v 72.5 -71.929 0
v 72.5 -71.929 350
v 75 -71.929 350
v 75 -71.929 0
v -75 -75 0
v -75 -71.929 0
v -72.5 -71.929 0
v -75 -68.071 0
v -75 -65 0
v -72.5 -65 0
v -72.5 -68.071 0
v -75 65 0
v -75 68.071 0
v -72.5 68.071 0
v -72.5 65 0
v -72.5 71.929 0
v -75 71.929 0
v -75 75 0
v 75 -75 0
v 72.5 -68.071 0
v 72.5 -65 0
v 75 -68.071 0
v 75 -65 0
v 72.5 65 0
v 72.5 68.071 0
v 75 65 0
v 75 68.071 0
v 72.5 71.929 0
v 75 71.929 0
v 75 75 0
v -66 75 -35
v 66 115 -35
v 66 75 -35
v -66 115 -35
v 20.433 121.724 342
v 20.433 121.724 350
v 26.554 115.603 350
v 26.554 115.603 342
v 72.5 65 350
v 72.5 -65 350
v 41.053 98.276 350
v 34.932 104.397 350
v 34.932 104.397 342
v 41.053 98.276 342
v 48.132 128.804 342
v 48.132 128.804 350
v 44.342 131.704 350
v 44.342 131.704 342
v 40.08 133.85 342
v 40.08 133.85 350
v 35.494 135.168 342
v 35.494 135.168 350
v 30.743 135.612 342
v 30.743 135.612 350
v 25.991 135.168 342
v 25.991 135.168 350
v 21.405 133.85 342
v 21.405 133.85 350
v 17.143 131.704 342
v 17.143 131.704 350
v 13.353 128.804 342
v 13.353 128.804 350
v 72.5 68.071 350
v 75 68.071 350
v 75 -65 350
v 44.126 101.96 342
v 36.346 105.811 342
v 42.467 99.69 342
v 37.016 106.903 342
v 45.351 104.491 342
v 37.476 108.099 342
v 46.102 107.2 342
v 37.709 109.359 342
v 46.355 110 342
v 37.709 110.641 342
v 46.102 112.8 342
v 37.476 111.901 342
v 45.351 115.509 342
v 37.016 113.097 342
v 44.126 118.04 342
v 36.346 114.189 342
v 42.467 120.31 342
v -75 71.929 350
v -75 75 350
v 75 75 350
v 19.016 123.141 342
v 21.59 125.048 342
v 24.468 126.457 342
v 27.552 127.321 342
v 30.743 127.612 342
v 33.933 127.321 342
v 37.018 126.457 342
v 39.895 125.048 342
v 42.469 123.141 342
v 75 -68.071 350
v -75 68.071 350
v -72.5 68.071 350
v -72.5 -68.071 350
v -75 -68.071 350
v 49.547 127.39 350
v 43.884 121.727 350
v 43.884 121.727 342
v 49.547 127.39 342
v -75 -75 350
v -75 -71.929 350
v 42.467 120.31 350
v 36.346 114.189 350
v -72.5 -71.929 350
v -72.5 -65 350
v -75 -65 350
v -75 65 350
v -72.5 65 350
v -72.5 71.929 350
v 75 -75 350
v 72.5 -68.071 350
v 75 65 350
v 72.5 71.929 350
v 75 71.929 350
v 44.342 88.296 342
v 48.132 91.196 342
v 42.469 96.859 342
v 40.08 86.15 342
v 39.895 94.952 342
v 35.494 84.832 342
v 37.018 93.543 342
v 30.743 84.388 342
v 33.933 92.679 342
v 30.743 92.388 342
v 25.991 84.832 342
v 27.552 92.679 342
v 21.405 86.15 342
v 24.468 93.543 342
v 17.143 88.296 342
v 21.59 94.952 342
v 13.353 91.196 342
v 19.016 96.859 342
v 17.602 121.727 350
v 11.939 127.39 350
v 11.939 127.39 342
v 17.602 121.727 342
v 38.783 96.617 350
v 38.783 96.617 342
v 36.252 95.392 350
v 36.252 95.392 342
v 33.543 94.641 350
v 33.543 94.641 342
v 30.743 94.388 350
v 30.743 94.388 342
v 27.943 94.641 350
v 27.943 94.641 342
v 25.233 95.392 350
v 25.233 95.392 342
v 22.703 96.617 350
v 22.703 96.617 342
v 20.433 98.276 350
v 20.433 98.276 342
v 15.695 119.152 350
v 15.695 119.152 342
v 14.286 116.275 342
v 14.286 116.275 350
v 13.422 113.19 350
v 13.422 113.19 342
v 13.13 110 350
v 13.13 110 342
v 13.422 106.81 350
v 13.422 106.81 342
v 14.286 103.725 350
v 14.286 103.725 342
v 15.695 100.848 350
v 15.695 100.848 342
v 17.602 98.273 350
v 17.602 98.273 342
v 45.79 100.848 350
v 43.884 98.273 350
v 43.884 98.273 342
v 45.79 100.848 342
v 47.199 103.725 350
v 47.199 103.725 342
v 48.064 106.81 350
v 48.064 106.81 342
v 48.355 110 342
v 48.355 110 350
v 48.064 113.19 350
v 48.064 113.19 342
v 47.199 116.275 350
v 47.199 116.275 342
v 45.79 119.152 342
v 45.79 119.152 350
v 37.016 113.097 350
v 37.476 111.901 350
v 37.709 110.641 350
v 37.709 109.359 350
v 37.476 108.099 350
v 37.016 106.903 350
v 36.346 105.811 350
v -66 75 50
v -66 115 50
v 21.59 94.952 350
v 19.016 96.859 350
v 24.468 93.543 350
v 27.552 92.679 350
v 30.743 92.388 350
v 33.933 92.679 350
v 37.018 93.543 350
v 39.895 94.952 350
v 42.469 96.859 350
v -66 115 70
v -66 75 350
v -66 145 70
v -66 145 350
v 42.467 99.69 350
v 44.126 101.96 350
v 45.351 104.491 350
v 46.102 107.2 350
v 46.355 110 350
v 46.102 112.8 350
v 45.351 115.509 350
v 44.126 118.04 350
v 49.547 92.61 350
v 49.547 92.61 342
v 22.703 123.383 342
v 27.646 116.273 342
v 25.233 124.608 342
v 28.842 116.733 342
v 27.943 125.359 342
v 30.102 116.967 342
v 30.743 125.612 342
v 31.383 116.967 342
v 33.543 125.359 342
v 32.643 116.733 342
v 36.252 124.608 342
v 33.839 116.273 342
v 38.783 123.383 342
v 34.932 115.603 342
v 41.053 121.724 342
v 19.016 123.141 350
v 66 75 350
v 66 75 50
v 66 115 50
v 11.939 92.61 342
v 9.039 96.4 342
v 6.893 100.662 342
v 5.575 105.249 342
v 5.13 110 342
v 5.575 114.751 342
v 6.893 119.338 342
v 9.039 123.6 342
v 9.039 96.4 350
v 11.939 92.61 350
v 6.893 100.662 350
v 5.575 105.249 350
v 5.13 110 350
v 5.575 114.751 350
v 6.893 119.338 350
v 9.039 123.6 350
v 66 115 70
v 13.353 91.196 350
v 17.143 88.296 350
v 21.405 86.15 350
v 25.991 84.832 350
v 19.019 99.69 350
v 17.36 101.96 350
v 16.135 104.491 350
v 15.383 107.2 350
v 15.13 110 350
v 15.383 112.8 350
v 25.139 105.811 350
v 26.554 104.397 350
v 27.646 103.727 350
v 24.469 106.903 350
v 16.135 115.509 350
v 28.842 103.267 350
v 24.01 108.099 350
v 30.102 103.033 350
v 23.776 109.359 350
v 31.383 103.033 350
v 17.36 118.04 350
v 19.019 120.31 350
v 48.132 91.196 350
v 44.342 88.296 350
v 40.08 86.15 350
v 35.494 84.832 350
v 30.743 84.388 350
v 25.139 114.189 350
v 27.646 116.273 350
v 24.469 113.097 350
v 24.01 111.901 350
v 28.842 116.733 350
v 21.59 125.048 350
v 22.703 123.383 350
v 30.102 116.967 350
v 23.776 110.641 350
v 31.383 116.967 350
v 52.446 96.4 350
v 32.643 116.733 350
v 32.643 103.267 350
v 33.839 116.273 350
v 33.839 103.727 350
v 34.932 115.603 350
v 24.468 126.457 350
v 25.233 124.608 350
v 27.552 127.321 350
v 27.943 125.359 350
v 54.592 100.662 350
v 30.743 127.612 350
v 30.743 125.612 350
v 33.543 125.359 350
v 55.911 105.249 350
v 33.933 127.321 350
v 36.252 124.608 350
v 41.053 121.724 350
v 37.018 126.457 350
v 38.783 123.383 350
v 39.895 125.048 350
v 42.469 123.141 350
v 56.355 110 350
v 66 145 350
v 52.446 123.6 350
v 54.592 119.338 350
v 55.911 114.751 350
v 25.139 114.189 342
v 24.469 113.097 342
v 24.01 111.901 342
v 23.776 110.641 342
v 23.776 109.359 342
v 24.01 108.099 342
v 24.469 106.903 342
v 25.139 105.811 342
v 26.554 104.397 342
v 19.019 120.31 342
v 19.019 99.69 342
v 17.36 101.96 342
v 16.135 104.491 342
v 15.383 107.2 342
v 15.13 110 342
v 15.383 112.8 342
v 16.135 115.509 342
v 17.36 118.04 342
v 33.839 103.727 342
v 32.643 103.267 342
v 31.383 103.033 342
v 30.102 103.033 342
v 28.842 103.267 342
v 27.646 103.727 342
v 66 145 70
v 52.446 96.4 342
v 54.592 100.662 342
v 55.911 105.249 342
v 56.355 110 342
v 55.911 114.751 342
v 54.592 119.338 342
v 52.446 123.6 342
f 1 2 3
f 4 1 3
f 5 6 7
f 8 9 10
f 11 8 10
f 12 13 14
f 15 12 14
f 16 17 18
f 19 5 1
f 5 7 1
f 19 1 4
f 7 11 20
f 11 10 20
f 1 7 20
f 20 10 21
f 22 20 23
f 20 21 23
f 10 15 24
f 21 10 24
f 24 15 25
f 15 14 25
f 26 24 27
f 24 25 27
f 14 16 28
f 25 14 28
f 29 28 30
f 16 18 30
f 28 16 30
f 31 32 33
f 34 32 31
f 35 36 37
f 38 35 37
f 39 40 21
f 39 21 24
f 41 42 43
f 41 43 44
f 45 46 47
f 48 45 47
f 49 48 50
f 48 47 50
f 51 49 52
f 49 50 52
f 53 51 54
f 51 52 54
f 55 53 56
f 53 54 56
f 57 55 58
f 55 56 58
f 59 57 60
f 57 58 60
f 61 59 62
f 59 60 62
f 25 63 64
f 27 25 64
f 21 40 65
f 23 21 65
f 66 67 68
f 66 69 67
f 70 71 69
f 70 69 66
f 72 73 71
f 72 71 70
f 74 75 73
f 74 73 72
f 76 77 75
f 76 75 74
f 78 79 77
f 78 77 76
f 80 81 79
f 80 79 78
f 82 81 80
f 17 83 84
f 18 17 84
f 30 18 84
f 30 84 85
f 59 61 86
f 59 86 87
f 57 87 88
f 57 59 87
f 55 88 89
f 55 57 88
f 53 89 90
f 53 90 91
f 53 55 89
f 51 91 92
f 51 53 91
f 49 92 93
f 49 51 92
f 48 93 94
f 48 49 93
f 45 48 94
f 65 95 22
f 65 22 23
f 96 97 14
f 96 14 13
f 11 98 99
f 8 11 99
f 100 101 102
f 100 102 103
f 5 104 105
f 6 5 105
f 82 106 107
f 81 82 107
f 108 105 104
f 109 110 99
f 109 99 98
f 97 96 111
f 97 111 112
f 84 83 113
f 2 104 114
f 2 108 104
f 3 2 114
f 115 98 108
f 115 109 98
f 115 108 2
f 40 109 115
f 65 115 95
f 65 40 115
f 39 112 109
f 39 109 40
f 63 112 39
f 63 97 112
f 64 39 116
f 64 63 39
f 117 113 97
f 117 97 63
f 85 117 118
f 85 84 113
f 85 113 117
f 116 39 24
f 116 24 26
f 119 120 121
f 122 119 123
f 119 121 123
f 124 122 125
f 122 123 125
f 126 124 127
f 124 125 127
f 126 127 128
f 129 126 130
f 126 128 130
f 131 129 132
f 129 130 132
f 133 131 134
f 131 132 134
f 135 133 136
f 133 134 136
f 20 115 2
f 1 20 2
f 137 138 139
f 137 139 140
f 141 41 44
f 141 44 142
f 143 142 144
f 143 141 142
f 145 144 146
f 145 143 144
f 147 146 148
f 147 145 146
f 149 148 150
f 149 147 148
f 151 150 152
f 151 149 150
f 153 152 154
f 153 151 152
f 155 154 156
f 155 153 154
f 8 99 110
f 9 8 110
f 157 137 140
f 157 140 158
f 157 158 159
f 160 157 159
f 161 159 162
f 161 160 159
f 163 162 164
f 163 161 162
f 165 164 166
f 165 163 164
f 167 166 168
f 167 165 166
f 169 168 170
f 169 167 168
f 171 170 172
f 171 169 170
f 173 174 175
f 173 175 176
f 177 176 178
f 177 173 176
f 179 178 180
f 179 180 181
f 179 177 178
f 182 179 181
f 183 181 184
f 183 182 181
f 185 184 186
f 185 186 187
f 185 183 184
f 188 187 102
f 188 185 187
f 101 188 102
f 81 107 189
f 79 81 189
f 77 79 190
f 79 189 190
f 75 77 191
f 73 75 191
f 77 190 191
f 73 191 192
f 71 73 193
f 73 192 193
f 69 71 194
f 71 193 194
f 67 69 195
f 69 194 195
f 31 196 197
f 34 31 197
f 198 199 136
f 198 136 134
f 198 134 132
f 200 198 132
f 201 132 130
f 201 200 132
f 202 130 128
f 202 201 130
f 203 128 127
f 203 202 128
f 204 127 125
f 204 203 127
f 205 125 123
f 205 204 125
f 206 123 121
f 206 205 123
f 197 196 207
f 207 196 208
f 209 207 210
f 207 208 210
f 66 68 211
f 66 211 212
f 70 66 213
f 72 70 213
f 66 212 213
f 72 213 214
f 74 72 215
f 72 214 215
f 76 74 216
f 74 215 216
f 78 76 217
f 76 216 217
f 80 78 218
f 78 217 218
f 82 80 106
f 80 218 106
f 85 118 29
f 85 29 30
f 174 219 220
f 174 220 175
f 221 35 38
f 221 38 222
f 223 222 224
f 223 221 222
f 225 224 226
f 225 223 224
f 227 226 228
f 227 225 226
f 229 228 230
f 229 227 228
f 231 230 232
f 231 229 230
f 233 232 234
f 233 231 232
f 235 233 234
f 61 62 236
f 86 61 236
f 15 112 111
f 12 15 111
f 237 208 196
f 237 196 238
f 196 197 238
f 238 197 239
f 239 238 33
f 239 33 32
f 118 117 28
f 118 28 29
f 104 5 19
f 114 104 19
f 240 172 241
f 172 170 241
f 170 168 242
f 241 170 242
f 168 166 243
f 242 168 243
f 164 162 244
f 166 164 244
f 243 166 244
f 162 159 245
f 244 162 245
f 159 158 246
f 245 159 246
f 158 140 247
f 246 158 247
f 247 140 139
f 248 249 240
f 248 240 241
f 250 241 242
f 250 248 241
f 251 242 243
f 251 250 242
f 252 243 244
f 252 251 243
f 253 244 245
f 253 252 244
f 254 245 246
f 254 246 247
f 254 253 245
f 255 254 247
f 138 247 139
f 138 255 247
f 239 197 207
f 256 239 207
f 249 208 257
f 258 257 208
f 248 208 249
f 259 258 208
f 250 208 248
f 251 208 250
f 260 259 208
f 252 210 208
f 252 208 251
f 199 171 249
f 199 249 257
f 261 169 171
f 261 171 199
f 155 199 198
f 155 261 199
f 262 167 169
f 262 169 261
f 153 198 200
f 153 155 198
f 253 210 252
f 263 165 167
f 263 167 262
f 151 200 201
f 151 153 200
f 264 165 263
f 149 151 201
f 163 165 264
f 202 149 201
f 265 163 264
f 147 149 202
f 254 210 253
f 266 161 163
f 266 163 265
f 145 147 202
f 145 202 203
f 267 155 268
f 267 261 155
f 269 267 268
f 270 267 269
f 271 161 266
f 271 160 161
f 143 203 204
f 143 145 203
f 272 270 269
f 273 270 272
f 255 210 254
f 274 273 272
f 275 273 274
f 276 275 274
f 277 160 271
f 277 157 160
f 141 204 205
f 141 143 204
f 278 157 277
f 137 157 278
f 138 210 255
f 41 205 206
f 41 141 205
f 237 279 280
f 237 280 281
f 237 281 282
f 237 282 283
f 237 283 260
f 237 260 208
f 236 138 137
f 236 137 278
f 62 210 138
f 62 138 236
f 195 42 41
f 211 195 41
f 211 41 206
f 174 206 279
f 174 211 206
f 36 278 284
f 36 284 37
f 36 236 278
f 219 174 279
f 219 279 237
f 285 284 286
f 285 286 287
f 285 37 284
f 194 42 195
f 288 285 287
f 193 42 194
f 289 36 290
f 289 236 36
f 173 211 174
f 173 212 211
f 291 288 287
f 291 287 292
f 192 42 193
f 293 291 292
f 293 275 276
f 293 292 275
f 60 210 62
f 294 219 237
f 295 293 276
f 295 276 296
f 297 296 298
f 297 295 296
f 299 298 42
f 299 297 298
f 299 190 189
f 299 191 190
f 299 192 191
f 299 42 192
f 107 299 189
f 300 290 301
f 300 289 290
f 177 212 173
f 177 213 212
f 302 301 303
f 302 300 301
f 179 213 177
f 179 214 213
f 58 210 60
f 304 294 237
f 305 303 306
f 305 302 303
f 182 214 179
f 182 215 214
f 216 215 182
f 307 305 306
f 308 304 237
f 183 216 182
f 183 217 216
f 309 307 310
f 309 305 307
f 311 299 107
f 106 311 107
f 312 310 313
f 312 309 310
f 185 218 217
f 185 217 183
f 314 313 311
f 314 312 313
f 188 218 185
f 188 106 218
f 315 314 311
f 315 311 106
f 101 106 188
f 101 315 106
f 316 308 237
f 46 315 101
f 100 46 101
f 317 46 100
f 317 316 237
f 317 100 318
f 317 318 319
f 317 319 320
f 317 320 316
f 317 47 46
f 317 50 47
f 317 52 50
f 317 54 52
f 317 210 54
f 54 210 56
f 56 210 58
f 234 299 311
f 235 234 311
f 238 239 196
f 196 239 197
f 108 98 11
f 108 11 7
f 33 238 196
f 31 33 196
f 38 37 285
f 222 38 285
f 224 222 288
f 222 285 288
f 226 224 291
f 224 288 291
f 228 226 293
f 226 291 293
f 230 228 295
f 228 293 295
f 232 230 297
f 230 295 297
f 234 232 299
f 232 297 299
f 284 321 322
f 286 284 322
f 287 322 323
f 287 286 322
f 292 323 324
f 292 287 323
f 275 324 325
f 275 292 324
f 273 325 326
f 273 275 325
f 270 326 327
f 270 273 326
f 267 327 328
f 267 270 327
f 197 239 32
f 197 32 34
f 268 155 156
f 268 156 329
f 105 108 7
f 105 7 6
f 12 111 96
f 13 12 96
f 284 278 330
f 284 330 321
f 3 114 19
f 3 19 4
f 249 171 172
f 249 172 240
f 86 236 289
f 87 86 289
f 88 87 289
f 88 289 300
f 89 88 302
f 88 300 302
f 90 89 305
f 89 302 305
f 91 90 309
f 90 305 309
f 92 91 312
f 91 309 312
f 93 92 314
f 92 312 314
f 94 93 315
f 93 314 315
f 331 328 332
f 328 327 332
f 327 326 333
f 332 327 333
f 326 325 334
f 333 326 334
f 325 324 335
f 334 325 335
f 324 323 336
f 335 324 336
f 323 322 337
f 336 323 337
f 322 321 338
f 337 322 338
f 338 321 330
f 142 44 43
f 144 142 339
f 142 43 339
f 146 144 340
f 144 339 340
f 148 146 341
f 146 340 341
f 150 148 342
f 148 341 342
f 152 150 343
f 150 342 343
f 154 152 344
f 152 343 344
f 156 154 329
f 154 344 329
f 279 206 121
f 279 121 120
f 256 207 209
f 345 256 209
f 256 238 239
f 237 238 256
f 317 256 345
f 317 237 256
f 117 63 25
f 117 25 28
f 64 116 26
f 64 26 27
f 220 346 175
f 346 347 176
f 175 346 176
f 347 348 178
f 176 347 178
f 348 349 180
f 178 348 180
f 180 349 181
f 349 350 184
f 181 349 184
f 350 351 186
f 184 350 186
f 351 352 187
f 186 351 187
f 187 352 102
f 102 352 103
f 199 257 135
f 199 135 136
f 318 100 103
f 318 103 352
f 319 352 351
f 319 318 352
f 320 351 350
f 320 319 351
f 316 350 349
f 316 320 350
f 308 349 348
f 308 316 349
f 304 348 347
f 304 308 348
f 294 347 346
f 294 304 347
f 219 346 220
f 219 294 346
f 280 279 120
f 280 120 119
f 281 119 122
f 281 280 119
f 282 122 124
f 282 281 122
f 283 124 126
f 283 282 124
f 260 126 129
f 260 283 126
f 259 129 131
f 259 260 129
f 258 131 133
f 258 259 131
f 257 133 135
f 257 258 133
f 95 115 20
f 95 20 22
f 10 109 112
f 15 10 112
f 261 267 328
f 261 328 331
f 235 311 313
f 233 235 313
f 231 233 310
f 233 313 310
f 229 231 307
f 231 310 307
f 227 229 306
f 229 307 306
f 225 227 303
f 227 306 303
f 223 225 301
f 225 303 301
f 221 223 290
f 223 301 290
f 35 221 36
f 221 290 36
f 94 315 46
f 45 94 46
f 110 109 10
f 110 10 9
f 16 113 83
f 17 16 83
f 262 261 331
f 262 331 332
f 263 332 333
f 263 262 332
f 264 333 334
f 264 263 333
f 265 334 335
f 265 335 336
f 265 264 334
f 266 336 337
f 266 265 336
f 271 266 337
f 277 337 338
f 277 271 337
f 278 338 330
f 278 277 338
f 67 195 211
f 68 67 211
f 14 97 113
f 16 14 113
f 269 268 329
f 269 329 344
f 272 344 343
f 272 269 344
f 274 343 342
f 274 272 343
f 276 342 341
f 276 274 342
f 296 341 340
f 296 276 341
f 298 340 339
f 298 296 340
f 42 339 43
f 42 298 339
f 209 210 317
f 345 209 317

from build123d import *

# Parameters (mm, degrees)
SKETCH1_W               = 150
SKETCH1_H               = 150
BOSS_EXTRUDE1_DEPTH     = 350
SKETCH2_W               = 132
SKETCH2_H               = 70
BOSS_EXTRUDE2_DEPTH     = 300
SKETCH3_W               = 20
SKETCH3_H               = 30
CUT_EXTRUDE1_DEPTH      = 300
SKETCH4_W               = 132
SKETCH4_H               = 40
BOSS_EXTRUDE3_DEPTH     = 85
SKETCH5_W               = 5
SKETCH5_H               = 130
CUT_EXTRUDE2_DEPTH      = 448
SKETCH6_W               = 5
SKETCH6_H               = 3.857436254
CUT_EXTRUDE3_DEPTH      = 448
MIRROR2_COPY_1_SKETCH_W = 5
MIRROR2_COPY_1_SKETCH_H = 3.857436254
MIRROR2_COPY_1_DEPTH    = 448
CUT_EXTRUDE5_DEPTH      = 8


with BuildPart() as part:
    # Sketch1 → Boss-Extrude1 (new body)
    with BuildSketch(Plane.XY):
        Rectangle(SKETCH1_W, SKETCH1_H)
    extrude(amount=BOSS_EXTRUDE1_DEPTH)

    # Sketch5 → Cut-Extrude2 (cut)
    with BuildSketch(Plane.XY.offset(350)):
        with Locations((75, 0)):
            Rectangle(SKETCH5_W, SKETCH5_H)
    cut_extrude2 = extrude(amount=-CUT_EXTRUDE2_DEPTH, mode=Mode.SUBTRACT)

    # Sketch6 → Cut-Extrude3 (cut)
    with BuildSketch(Plane.XY.offset(350)):
        with Locations((75, 70)):
            Rectangle(SKETCH6_W, SKETCH6_H)
    cut_extrude3 = extrude(amount=-CUT_EXTRUDE3_DEPTH, mode=Mode.SUBTRACT)

    # Mirror1: Cut-Extrude3 across plane
    add(cut_extrude3.mirror(Plane.ZX), mode=Mode.SUBTRACT)

    # Mirror2: Cut-Extrude2, Cut-Extrude3 across plane
    add(cut_extrude2.mirror(Plane(origin=(0, 0, 0), x_dir=(0, 0, 1), z_dir=(1, 0, 0))), mode=Mode.SUBTRACT)
    add(cut_extrude3.mirror(Plane(origin=(0, 0, 0), x_dir=(0, 0, 1), z_dir=(1, 0, 0))), mode=Mode.SUBTRACT)

    # Mirror2 copy 1 sketch → Mirror2 copy 1 (cut)
    with BuildSketch(Plane(origin=(0, 0, 350), x_dir=(-1, 0, 0), z_dir=(0, 0, 1))):
        with Locations((75, 70)):
            Rectangle(MIRROR2_COPY_1_SKETCH_W, MIRROR2_COPY_1_SKETCH_H)
    extrude(amount=-MIRROR2_COPY_1_DEPTH, mode=Mode.SUBTRACT)


with BuildPart() as body_2:
    # Sketch2 → Boss-Extrude2 (new body)
    with BuildSketch(Plane.XY.offset(350)):
        with Locations((0, 110)):
            Rectangle(SKETCH2_W, SKETCH2_H)
    extrude(amount=-BOSS_EXTRUDE2_DEPTH)

    # Sketch3 → Cut-Extrude1 (cut)
    with BuildSketch(Plane.ZY.offset(66)):
        with Locations((60, 130)):
            Rectangle(SKETCH3_W, SKETCH3_H)
    extrude(amount=-CUT_EXTRUDE1_DEPTH, mode=Mode.SUBTRACT)

    # Sketch7 → Cut-Extrude5 (cut)
    with BuildSketch(Plane.XY.offset(350)):
        with BuildLine():
            Line((34.931688454, 104.396773358), (41.052524005, 98.275937807))
            ThreePointArc((41.052524005, 98.275937807), (30.742675374, 94.387613472), (20.432826744, 98.275937807))
            Line((20.432826744, 98.275937807), (26.553662294, 104.396773358))
            ThreePointArc((26.553662294, 104.396773358), (30.742675374, 103.004002617), (34.931688454, 104.396773358))
        make_face()
        with BuildLine():
            Line((36.345902017, 105.81098692), (42.466737568, 99.690151369))
            ThreePointArc((42.466737568, 99.690151369), (46.355061902, 110), (42.466737568, 120.309848631))
            Line((42.466737568, 120.309848631), (36.345902017, 114.18901308))
            ThreePointArc((36.345902017, 114.18901308), (37.738672758, 110), (36.345902017, 105.81098692))
        make_face()
        with BuildLine():
            Line((43.883529765, 121.726640828), (49.546665087, 127.38977615))
            ThreePointArc((49.546665087, 127.38977615), (56.355061902, 110), (49.546665087, 92.61022385))
            Line((49.546665087, 92.61022385), (43.883529765, 98.273359172))
            ThreePointArc((43.883529765, 98.273359172), (48.355061902, 110), (43.883529765, 121.726640828))
        make_face()
        with BuildLine():
            Line((34.931688454, 115.603226642), (41.052524005, 121.724062193))
            ThreePointArc((41.052524005, 121.724062193), (30.742675374, 125.612386528), (20.432826744, 121.724062193))
            Line((20.432826744, 121.724062193), (26.553662294, 115.603226642))
            ThreePointArc((26.553662294, 115.603226642), (30.742675374, 116.995997383), (34.931688454, 115.603226642))
        make_face()
        with BuildLine():
            Line((42.469316202, 123.14085439), (48.132451524, 128.803989713))
            ThreePointArc((48.132451524, 128.803989713), (30.742675374, 135.612386528), (13.352899224, 128.803989713))
            Line((13.352899224, 128.803989713), (19.016034546, 123.14085439))
            ThreePointArc((19.016034546, 123.14085439), (30.742675374, 127.612386528), (42.469316202, 123.14085439))
        make_face()
        with BuildLine():
            Line((42.469316202, 96.85914561), (48.132451524, 91.196010287))
            ThreePointArc((48.132451524, 91.196010287), (30.742675374, 84.387613472), (13.352899224, 91.196010287))
            Line((13.352899224, 91.196010287), (19.016034546, 96.85914561))
            ThreePointArc((19.016034546, 96.85914561), (30.742675374, 92.387613472), (42.469316202, 96.85914561))
        make_face()
        with BuildLine():
            Line((25.139448732, 105.81098692), (19.018613181, 99.690151369))
            ThreePointArc((19.018613181, 99.690151369), (15.130288846, 110), (19.018613181, 120.309848631))
            Line((19.018613181, 120.309848631), (25.139448732, 114.18901308))
            ThreePointArc((25.139448732, 114.18901308), (23.746677991, 110), (25.139448732, 105.81098692))
        make_face()
        with BuildLine():
            Line((17.601820984, 98.273359172), (11.938685662, 92.61022385))
            ThreePointArc((11.938685662, 92.61022385), (5.130288846, 110), (11.938685662, 127.38977615))
            Line((11.938685662, 127.38977615), (17.601820984, 121.726640828))
            ThreePointArc((17.601820984, 121.726640828), (13.130288846, 110), (17.601820984, 98.273359172))
        make_face()
    extrude(amount=-CUT_EXTRUDE5_DEPTH, mode=Mode.SUBTRACT)


with BuildPart() as body_3:
    # Sketch4 → Boss-Extrude3 (new body)
    with BuildSketch(Plane(origin=(0, 0, 50), x_dir=(-1, 0, 0), z_dir=(0, 0, -1))):
        with Locations((0, 95)):
            Rectangle(SKETCH4_W, SKETCH4_H)
    extrude(amount=BOSS_EXTRUDE3_DEPTH)


solid = Compound([part.part, body_2.part, body_3.part])
